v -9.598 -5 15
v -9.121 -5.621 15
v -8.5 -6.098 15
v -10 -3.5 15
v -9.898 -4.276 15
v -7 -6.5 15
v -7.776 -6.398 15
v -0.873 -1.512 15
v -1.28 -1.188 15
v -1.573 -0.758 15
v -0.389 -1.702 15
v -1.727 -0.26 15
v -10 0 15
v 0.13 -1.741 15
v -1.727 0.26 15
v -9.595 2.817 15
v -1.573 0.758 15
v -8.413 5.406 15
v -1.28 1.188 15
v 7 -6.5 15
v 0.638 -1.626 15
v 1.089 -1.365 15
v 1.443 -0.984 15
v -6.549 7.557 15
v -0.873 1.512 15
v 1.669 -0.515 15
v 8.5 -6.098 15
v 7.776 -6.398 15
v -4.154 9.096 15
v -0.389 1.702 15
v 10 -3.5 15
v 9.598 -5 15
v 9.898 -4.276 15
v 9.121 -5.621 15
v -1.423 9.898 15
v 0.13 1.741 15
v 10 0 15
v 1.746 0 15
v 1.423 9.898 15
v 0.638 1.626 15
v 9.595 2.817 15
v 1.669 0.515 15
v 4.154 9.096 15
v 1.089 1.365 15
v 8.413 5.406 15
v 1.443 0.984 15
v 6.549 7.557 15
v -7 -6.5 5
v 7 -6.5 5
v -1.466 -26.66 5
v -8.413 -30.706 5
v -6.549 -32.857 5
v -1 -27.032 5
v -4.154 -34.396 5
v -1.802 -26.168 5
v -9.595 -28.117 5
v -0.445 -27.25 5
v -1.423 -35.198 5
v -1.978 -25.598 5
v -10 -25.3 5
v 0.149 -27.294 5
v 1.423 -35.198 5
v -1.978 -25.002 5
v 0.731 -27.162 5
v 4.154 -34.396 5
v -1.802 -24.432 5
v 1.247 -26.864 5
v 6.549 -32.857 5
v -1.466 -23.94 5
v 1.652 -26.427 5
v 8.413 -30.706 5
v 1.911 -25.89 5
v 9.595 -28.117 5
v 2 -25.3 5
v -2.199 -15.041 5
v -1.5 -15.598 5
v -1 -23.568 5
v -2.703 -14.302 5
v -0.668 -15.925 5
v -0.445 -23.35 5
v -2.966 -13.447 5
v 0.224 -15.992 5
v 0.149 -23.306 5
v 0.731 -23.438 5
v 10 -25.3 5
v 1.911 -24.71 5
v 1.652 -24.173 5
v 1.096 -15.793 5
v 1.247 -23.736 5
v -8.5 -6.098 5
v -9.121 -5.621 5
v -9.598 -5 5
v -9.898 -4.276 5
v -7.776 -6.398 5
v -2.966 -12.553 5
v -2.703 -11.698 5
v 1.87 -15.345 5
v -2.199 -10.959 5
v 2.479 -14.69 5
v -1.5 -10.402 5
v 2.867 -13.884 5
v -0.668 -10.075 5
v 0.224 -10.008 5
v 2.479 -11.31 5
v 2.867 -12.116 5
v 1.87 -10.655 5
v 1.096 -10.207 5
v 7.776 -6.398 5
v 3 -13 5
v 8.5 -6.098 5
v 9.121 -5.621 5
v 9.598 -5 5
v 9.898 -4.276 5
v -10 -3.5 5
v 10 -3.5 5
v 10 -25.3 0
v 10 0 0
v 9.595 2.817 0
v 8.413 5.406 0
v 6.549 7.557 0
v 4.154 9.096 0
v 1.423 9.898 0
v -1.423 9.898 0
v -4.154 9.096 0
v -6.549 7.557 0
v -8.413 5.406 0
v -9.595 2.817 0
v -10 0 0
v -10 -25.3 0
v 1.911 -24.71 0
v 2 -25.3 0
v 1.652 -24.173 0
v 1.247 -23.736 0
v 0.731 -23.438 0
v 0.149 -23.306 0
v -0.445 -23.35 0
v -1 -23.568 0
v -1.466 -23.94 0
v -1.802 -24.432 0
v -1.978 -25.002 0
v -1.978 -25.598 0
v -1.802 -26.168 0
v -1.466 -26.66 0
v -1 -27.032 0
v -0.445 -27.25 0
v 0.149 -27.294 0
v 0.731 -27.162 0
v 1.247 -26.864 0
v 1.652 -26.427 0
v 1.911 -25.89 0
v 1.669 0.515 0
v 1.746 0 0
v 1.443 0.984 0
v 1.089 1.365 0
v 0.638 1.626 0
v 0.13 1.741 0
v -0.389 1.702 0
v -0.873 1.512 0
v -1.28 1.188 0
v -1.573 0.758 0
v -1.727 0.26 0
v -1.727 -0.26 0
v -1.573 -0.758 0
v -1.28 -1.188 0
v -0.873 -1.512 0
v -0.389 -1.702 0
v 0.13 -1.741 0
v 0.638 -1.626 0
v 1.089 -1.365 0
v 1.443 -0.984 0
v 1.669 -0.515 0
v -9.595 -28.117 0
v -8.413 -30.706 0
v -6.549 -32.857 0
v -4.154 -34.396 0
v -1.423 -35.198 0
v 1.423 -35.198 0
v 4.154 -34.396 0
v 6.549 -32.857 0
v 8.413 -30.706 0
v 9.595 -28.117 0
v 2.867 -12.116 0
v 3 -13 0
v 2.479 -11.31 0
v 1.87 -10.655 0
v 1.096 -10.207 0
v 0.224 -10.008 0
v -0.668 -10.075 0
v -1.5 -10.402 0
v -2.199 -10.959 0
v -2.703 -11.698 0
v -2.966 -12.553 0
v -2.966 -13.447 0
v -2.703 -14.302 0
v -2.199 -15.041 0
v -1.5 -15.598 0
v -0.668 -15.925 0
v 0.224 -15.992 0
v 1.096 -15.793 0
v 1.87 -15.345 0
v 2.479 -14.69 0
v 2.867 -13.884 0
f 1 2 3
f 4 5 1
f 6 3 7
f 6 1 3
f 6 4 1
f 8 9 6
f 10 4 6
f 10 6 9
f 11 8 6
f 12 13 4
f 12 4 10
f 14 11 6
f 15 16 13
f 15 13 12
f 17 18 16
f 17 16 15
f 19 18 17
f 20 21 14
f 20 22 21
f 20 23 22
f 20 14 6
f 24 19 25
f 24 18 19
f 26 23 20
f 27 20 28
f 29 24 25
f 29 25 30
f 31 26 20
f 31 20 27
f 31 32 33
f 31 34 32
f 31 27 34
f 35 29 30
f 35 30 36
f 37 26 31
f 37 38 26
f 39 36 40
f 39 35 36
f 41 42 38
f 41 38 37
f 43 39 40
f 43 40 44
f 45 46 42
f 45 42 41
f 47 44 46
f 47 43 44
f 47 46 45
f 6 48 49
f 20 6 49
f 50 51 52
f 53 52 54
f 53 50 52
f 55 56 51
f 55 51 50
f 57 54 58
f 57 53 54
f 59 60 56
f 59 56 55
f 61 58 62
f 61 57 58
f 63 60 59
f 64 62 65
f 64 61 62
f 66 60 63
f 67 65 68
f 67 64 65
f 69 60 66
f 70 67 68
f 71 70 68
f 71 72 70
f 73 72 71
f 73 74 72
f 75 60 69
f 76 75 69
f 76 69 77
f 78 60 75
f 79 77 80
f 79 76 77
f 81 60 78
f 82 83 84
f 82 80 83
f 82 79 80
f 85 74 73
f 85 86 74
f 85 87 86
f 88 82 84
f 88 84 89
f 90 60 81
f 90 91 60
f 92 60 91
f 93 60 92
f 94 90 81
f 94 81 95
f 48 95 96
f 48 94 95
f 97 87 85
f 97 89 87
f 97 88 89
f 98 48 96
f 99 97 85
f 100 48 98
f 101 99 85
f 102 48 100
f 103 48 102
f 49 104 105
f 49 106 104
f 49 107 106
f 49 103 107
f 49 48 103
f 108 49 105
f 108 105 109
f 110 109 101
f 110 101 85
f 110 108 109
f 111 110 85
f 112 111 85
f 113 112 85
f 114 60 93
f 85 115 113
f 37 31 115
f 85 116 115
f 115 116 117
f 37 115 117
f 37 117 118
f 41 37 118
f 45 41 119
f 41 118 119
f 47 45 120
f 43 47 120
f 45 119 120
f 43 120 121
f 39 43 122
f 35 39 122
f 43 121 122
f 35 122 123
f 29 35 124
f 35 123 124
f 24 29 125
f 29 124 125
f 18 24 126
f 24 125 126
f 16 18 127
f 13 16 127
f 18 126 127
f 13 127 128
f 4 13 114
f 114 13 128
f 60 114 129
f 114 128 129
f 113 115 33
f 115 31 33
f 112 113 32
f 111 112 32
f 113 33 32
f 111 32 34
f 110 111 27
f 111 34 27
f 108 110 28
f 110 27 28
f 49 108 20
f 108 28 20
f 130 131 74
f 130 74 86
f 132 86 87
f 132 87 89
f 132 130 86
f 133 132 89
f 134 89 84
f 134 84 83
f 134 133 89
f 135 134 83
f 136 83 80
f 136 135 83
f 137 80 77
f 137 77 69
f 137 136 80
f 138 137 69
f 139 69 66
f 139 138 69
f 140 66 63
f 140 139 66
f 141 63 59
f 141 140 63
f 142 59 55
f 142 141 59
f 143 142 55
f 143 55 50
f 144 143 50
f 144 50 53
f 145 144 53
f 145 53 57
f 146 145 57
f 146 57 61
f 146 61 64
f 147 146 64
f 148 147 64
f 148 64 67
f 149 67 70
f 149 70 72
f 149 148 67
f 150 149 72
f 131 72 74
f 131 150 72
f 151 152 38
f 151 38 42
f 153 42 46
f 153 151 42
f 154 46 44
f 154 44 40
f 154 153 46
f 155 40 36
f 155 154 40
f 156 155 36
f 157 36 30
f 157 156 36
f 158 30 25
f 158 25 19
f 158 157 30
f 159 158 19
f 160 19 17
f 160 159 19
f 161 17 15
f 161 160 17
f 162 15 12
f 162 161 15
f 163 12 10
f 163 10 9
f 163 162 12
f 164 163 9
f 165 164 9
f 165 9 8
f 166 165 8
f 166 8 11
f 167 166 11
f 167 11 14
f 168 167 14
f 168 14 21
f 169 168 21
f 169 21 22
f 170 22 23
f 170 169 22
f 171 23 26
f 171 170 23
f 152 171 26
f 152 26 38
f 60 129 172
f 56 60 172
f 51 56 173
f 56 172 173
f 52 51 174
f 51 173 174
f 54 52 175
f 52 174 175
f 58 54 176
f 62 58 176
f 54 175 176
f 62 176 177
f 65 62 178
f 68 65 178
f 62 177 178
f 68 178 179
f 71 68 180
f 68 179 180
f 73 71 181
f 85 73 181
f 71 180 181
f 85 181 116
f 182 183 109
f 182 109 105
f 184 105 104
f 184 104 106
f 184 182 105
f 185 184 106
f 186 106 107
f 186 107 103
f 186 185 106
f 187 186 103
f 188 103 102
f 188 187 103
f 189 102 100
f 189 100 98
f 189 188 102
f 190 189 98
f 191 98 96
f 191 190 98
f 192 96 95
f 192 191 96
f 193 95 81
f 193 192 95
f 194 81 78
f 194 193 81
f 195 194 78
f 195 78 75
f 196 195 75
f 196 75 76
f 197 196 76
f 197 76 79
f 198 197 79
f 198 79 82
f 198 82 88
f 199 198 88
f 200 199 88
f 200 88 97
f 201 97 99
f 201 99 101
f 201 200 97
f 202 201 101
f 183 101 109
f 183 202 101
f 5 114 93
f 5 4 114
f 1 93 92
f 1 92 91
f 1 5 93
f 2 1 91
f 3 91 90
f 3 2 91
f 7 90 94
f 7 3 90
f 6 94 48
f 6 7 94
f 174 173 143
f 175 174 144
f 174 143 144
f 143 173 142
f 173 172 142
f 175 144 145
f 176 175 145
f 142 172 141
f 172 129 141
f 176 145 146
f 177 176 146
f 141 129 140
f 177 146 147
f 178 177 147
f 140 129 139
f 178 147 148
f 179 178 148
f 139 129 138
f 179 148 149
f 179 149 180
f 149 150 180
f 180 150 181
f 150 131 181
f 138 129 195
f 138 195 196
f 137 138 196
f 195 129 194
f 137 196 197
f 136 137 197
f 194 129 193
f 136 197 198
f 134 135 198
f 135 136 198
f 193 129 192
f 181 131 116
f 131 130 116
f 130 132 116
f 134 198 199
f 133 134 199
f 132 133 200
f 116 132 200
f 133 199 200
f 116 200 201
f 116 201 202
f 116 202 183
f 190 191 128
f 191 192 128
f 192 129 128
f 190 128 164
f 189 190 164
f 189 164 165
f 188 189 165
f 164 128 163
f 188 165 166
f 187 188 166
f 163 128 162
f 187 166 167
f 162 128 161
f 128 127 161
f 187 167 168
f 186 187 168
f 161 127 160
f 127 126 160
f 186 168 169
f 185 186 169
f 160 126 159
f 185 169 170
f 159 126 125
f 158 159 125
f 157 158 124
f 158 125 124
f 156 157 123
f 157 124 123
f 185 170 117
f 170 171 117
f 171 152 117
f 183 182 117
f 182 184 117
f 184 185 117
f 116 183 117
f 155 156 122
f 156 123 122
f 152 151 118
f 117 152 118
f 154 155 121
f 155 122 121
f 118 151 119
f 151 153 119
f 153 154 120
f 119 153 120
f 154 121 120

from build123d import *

# Parameters (mm, degrees)
SKETCH1_R           = 2
SKETCH1_R_2         = 3
BOSS_EXTRUDE1_DEPTH = 5
SKETCH1_3_R         = 1.74625
BOSS_EXTRUDE2_DEPTH = 15
FILLET1_R           = 3


with BuildPart() as part:
    # Sketch1 → Boss-Extrude1 (new body)
    with BuildSketch(Plane.XY):
        with BuildLine():
            Line((10, -25.3), (10, -6.5))
            Line((10, -6.5), (-10, -6.5))
            Line((-10, -6.5), (-10, -25.3))
            ThreePointArc((-10, -25.3), (0, -35.3), (10, -25.3))
        make_face()
        with Locations((0, -25.3)):
            Circle(SKETCH1_R, mode=Mode.SUBTRACT)
        with Locations((0, -13)):
            Circle(SKETCH1_R_2, mode=Mode.SUBTRACT)
    extrude(amount=BOSS_EXTRUDE1_DEPTH)

    # Sketch1<3> → Boss-Extrude2 (add)
    with BuildSketch(Plane.XY):
        with BuildLine():
            Line((10, -6.5), (10, 0))
            ThreePointArc((10, 0), (0, 10), (-10, 0))
            Line((-10, 0), (-10, -6.5))
            Line((-10, -6.5), (10, -6.5))
        make_face()
        Circle(SKETCH1_3_R, mode=Mode.SUBTRACT)
    extrude(amount=BOSS_EXTRUDE2_DEPTH)

    # Fillet1
    fillet1_edges = [part.edges().sort_by_distance(p)[0] for p in [
        (-10, -6.5, 10),
        (10, -6.5, 10),
    ]]
    fillet(fillet1_edges, radius=FILLET1_R)


solid = part.part
